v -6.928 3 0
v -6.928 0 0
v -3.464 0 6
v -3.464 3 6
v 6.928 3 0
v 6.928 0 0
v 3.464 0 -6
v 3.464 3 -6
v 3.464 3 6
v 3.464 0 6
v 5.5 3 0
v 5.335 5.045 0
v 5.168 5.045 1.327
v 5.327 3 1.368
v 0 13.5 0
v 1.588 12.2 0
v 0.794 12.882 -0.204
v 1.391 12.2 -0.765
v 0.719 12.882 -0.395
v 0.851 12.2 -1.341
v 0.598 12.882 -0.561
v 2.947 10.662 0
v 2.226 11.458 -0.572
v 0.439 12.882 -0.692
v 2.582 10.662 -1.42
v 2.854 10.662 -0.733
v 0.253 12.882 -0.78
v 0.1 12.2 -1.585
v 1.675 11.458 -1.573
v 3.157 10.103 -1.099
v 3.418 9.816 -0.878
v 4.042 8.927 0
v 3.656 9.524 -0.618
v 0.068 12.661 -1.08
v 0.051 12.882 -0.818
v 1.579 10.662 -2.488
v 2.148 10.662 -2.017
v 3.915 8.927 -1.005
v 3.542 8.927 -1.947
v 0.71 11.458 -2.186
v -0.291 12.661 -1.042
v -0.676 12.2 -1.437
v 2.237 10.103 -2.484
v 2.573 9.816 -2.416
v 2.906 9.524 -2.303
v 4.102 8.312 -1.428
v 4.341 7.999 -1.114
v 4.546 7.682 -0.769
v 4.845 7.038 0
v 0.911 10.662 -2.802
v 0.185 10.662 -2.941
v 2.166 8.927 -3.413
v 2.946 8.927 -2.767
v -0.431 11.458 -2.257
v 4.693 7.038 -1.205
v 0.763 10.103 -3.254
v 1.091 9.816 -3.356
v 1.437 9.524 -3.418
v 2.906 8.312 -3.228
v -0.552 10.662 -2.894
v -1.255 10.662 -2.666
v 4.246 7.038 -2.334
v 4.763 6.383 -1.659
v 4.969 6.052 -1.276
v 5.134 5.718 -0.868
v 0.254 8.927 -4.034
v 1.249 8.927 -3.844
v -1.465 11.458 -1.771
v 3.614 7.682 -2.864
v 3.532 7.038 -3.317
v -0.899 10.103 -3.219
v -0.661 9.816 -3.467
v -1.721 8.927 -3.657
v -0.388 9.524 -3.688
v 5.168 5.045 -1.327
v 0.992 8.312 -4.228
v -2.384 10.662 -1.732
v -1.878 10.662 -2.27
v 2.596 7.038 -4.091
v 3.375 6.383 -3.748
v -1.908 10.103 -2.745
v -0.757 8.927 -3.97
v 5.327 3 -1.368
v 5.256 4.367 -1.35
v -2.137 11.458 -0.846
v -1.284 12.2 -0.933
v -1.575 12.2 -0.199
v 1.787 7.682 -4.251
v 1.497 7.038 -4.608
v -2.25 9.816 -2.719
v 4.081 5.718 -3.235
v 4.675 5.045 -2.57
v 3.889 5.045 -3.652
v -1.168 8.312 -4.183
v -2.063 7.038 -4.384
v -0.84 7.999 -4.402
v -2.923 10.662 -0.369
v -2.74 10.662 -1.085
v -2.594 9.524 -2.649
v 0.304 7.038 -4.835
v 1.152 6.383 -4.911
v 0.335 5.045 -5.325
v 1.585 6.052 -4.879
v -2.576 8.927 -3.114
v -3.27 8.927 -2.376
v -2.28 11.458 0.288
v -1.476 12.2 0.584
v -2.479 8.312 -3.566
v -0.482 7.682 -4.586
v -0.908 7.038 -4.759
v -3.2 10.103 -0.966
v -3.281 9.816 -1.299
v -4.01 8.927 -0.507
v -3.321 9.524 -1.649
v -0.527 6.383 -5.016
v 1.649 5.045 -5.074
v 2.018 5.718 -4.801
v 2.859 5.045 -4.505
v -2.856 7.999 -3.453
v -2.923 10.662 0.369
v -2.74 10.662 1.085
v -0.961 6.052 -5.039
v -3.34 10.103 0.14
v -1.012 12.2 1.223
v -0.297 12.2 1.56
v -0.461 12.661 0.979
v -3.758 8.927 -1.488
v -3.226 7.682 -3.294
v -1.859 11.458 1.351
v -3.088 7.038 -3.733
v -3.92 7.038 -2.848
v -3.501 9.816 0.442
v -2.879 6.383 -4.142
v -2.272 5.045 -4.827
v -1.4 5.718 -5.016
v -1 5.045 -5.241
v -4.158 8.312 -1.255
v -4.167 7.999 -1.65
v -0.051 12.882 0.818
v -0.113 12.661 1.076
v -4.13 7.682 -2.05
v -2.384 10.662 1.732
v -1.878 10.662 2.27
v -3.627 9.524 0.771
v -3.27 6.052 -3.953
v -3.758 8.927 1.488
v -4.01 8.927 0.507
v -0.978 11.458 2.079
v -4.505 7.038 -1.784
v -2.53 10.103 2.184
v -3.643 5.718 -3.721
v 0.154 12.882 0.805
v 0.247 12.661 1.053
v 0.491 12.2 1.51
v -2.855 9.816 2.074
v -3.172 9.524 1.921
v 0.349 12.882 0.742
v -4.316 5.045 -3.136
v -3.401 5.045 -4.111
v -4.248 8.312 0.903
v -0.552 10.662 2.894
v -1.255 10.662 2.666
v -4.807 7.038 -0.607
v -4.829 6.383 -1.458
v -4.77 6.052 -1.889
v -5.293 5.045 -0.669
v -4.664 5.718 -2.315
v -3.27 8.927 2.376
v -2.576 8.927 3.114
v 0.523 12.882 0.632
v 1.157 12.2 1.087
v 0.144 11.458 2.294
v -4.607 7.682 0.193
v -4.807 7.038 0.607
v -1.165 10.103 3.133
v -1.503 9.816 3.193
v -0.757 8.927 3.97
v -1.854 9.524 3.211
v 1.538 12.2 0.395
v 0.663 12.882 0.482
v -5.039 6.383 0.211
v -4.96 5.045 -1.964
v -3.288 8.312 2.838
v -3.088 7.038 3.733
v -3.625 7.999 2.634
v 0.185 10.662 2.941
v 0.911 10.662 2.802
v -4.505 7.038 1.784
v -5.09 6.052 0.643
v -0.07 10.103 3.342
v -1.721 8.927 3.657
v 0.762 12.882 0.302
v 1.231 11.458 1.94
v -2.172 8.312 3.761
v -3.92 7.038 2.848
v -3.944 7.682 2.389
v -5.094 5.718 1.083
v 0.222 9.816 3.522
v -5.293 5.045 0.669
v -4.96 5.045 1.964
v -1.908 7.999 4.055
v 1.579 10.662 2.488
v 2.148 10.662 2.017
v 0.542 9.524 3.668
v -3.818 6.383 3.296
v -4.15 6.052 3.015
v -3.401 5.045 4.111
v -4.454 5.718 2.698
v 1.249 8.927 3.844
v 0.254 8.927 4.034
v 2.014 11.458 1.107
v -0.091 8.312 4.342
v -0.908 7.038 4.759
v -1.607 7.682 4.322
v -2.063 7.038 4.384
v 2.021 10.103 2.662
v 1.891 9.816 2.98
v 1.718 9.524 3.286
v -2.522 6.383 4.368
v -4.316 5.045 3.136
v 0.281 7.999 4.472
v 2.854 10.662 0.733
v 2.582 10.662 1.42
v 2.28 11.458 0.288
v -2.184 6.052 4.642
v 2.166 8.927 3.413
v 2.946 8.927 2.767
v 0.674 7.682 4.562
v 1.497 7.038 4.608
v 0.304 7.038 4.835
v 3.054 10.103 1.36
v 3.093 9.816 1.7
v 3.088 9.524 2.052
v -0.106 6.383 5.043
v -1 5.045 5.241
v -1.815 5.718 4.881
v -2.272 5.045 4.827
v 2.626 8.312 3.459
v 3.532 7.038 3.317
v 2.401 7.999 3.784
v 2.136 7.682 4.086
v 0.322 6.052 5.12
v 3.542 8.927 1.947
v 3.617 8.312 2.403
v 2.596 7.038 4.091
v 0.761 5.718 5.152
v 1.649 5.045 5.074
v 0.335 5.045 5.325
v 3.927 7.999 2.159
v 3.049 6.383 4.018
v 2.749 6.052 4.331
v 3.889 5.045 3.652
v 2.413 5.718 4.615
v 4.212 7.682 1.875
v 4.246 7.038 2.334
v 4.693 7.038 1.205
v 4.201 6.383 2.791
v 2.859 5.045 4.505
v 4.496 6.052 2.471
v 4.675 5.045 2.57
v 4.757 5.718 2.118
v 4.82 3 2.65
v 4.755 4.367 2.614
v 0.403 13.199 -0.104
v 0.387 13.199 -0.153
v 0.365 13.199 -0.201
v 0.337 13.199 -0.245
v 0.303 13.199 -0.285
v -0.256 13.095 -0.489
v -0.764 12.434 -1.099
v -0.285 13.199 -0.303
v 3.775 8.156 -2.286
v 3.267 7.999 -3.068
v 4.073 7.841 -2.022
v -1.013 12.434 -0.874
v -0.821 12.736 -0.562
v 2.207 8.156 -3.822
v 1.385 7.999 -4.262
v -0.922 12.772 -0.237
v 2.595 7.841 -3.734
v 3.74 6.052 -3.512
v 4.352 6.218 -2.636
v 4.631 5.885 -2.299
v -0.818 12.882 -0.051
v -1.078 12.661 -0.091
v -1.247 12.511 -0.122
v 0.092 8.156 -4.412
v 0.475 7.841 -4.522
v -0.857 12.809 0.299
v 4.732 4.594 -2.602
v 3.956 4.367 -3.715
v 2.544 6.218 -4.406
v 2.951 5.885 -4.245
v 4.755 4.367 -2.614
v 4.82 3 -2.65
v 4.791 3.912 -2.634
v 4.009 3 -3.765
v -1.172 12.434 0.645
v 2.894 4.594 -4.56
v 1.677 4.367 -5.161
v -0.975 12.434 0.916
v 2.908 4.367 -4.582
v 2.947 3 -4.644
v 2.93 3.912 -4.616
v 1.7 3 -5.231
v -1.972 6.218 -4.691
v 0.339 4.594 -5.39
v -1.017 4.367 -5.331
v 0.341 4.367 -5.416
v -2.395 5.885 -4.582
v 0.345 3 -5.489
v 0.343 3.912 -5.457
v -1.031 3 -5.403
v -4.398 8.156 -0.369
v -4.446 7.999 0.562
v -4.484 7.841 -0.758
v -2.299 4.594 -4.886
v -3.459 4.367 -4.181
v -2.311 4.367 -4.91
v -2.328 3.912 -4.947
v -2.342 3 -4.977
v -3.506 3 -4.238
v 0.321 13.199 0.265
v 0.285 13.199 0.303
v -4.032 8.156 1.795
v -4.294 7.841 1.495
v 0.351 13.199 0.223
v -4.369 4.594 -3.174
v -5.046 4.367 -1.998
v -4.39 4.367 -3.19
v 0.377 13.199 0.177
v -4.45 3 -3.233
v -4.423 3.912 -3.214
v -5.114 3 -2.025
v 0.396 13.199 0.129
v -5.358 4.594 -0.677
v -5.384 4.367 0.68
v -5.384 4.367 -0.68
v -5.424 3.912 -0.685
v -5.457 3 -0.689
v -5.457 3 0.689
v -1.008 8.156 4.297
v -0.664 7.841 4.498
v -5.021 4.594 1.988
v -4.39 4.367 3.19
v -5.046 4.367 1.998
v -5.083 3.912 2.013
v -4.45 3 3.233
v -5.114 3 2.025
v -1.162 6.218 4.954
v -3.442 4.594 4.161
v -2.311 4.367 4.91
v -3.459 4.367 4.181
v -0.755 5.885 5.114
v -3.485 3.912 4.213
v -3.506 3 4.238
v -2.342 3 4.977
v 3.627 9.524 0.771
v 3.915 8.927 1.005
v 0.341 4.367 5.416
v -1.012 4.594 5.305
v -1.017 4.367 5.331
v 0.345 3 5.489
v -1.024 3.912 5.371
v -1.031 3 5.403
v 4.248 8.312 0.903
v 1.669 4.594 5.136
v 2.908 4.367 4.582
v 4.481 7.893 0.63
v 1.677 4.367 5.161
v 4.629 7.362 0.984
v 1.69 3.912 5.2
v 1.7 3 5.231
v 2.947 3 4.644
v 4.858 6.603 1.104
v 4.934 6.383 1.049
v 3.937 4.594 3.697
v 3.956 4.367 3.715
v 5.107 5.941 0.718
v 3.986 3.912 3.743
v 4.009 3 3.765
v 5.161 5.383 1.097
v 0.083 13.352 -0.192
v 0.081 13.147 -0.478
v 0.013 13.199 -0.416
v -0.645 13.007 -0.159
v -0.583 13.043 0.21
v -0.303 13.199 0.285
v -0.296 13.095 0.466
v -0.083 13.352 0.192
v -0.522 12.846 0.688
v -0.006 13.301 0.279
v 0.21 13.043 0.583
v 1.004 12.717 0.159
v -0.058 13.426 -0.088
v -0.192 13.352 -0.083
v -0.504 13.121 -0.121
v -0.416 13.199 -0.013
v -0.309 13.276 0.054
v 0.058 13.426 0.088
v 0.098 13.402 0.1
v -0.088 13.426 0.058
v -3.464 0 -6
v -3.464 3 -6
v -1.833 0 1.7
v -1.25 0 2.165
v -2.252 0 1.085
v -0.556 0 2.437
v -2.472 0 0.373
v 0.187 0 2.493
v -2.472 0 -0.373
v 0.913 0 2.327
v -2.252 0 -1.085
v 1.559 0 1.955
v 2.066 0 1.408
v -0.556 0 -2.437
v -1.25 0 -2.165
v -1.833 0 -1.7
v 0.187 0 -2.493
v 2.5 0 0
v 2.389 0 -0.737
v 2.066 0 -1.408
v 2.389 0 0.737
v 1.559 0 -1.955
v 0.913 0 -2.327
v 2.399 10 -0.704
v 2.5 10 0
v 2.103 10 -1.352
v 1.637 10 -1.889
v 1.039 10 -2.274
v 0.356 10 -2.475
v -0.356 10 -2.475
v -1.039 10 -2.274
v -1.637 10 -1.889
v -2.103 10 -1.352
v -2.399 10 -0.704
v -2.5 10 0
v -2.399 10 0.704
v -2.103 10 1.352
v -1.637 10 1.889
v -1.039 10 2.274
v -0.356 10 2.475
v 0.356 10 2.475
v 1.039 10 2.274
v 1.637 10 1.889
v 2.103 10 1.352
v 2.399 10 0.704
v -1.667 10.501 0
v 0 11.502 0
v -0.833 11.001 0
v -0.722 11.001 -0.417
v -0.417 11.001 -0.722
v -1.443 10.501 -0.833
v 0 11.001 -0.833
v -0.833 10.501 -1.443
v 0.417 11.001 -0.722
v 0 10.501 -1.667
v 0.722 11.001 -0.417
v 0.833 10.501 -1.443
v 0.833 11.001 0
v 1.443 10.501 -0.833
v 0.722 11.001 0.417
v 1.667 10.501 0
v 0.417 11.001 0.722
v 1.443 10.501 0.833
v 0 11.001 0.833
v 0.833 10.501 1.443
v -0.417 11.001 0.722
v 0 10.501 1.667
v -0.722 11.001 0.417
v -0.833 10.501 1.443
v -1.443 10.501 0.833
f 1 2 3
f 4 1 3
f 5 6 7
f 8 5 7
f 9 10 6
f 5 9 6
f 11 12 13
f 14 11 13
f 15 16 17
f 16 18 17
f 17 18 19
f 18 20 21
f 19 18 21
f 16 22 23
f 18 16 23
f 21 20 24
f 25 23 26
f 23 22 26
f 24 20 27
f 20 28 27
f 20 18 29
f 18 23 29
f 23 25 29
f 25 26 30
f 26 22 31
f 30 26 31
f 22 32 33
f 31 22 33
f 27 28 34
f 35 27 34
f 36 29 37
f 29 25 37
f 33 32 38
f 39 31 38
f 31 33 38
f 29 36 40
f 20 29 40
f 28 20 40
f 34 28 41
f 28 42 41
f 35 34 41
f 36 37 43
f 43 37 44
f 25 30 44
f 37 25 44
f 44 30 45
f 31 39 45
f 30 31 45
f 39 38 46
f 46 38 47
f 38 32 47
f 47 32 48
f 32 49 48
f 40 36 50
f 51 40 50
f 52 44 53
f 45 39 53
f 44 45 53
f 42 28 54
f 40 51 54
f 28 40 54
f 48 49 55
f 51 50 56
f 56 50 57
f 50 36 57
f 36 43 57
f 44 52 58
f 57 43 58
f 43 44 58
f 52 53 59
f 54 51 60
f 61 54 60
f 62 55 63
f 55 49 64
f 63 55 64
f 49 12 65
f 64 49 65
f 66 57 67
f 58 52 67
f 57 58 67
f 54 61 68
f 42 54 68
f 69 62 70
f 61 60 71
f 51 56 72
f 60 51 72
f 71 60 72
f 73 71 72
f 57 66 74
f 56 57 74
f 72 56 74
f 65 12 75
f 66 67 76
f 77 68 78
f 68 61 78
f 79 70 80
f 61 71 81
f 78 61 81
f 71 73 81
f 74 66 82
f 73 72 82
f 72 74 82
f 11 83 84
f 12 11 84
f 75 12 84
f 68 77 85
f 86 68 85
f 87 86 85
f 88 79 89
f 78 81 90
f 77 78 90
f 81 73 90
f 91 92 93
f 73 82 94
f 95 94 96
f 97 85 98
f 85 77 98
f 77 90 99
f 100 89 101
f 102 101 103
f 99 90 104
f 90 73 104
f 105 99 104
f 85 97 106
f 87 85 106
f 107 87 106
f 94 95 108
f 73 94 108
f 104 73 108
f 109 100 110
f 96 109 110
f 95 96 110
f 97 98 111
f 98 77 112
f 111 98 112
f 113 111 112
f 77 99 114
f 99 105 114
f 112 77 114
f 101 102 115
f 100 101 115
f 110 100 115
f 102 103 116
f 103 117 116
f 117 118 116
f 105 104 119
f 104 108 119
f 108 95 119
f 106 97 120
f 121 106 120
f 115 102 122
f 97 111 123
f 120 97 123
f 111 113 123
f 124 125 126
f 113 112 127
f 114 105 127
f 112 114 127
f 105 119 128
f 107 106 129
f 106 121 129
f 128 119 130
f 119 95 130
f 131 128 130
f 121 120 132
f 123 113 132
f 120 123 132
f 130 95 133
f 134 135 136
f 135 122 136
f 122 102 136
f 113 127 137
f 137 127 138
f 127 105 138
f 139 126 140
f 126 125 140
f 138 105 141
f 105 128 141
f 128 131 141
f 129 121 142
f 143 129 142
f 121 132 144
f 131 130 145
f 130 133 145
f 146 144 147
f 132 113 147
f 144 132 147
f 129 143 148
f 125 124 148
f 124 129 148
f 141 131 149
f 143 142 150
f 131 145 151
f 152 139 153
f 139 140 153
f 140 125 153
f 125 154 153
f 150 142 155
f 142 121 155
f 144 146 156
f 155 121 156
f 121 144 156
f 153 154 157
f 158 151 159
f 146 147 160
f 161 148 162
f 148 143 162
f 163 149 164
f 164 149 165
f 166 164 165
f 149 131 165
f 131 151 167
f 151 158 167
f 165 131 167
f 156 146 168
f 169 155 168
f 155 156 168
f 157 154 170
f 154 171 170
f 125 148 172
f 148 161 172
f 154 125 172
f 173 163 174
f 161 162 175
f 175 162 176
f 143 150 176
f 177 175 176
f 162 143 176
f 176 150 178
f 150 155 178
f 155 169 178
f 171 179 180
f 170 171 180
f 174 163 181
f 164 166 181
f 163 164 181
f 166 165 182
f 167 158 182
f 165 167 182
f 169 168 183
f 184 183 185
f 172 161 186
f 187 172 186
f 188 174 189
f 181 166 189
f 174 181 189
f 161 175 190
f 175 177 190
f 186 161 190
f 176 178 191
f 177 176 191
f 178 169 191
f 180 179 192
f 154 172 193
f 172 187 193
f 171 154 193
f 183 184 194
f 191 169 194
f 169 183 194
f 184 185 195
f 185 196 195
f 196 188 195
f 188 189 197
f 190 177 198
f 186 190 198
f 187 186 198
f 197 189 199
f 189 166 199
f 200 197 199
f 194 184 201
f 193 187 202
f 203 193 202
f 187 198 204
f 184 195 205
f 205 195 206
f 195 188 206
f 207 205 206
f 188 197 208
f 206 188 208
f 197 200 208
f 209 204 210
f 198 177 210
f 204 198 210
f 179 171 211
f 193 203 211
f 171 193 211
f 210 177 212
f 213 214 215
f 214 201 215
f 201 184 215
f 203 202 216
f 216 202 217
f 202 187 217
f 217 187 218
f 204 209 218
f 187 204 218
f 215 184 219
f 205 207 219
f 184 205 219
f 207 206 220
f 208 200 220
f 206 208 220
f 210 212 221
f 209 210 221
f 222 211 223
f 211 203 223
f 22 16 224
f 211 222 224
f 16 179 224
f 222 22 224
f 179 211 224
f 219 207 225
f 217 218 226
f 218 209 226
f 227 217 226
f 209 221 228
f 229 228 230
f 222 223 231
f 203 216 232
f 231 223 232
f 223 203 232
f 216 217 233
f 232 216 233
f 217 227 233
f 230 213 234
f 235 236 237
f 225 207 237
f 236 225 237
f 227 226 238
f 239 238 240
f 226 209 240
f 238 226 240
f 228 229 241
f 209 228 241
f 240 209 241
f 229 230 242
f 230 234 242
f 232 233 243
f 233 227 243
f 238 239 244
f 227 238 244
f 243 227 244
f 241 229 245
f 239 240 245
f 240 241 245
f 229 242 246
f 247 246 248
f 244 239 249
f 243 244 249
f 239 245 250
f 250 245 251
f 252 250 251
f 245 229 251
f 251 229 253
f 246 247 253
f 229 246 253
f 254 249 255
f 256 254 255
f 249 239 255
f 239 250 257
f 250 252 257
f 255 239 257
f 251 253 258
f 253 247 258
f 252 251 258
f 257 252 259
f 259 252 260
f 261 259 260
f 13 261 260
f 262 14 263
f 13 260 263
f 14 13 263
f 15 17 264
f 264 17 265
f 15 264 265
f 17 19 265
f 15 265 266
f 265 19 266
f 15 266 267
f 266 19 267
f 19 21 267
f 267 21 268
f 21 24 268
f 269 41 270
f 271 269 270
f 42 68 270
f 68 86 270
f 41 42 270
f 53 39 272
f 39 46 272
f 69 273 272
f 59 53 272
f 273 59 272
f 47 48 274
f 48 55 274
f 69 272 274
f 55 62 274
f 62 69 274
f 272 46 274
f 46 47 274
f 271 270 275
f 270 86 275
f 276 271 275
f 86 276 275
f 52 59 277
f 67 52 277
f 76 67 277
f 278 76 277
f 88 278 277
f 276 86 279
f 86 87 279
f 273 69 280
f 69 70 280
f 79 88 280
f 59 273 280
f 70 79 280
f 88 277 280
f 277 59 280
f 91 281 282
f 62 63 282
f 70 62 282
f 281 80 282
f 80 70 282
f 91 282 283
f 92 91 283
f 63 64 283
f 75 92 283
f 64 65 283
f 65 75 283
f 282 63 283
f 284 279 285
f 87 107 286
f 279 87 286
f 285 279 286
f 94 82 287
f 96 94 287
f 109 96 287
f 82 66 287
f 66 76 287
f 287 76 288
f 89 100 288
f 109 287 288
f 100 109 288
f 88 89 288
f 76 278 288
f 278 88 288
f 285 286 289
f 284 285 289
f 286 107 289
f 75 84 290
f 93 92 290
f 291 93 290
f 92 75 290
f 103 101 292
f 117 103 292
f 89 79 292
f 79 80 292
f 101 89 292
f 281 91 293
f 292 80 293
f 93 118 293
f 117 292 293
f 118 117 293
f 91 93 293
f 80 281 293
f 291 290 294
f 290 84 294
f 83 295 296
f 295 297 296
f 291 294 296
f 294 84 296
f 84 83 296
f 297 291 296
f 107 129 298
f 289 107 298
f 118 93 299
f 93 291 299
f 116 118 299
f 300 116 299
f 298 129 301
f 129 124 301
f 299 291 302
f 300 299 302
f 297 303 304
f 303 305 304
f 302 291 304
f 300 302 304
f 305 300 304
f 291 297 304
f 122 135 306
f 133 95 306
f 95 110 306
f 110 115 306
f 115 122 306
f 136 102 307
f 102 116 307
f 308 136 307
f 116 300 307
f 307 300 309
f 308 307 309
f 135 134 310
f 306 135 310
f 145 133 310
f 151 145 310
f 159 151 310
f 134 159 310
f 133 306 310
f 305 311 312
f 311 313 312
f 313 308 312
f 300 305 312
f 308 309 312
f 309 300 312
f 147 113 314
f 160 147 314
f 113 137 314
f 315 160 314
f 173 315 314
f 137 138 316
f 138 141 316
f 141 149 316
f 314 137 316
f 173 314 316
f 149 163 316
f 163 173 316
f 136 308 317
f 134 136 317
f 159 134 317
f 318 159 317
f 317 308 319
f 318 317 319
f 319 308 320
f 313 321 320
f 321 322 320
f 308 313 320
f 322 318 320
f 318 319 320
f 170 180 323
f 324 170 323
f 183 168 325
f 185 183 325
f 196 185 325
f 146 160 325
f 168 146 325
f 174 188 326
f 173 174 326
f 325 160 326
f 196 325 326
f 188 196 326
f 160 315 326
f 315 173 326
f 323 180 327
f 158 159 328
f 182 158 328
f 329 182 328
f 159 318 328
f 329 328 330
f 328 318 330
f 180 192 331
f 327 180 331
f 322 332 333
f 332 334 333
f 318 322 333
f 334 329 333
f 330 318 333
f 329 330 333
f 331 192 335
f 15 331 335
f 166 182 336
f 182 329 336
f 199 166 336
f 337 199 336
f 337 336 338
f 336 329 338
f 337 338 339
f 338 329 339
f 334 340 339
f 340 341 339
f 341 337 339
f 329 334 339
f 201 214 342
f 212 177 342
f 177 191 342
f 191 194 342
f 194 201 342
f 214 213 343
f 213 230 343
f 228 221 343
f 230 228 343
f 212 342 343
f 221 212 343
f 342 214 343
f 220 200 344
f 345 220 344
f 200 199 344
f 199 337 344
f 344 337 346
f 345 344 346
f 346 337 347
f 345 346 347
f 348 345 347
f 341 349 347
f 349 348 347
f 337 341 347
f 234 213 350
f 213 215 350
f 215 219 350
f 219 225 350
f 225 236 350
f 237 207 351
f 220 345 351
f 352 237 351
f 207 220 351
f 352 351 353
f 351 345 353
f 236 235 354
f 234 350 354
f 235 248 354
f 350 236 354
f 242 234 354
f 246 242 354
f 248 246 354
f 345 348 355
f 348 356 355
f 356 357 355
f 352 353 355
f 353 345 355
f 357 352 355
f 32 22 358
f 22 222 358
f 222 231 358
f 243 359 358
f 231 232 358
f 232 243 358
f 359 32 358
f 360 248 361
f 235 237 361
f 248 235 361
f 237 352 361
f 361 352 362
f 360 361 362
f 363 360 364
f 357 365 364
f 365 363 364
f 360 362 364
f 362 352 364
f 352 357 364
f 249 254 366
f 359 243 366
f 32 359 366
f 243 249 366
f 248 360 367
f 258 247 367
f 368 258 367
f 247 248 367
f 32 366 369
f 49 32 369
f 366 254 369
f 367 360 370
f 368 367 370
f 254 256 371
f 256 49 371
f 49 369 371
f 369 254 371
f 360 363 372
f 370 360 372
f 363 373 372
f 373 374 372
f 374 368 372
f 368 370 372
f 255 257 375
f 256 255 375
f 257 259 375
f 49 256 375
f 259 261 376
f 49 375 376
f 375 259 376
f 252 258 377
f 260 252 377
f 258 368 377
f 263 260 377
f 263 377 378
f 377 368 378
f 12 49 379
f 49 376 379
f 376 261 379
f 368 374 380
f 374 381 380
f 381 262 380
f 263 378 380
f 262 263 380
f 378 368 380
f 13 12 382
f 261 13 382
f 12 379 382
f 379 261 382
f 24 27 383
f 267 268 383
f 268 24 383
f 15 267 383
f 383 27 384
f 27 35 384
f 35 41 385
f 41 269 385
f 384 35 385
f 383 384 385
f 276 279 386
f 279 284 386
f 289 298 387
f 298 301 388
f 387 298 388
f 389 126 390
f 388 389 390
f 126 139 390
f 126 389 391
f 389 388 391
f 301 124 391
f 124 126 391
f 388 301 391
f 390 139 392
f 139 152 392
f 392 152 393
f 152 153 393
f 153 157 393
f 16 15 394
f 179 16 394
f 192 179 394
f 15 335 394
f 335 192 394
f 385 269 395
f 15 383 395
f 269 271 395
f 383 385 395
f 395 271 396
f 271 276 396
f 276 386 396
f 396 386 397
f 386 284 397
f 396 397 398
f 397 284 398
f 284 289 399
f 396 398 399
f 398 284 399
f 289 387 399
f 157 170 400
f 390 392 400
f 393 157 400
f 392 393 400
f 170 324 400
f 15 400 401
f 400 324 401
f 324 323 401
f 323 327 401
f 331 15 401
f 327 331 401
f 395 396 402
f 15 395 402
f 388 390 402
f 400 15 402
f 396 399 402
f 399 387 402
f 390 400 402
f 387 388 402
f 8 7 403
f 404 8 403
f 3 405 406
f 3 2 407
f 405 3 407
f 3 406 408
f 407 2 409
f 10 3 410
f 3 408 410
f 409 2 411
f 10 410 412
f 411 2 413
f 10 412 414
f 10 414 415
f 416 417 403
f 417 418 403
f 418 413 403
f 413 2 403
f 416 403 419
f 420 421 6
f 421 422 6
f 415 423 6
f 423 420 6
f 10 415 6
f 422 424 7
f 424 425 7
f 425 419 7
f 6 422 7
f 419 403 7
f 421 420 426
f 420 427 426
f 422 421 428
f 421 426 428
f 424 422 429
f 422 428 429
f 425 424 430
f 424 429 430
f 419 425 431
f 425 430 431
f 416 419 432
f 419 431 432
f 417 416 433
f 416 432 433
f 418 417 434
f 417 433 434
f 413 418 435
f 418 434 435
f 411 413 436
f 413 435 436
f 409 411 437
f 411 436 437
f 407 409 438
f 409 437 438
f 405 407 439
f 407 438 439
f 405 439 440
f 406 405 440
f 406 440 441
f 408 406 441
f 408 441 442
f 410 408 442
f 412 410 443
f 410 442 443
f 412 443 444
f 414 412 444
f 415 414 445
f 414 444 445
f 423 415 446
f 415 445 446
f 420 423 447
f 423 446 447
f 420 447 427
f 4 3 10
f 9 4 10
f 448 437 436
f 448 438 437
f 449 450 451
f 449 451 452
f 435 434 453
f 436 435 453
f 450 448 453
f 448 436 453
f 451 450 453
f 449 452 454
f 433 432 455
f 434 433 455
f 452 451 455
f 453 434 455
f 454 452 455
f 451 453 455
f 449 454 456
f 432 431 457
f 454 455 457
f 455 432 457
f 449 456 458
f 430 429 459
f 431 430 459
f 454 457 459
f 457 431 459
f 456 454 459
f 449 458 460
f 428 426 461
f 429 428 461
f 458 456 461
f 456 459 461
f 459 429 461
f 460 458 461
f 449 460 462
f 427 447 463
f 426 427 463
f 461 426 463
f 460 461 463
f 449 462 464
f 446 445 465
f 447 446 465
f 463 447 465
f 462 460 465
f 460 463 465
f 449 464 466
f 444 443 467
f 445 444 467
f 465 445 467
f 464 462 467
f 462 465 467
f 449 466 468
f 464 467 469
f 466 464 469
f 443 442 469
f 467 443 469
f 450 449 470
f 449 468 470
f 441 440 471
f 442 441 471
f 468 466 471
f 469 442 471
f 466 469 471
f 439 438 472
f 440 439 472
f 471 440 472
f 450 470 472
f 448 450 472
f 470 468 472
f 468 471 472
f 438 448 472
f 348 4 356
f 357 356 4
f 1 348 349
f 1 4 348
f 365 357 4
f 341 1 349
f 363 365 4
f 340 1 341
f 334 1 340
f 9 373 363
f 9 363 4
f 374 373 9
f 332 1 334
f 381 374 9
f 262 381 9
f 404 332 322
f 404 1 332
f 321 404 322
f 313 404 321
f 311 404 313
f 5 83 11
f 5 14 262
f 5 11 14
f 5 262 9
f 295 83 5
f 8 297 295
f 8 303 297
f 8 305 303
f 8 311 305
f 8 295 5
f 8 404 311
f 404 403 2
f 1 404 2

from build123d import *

# Parameters (mm, degrees)
BOSS_EXTRUDE1_DEPTH   = 3
M6_TAPPED_HOLE1_D     = 5
M6_TAPPED_HOLE1_DEPTH = 10
M6_TAPPED_HOLE1_TIP   = 1.502151548


with BuildPart() as part:
    # Sketch1 → Boss-Extrude1 (new body)
    with BuildSketch(Plane(origin=(0, 0, 0), x_dir=(1, 0, 0), z_dir=(0, 1, 0))):
        Polygon((6.92820323, 0), (3.464101615, 6), (-3.464101615, 6), (-6.92820323, 0), (-3.464101615, -6), (3.464101615, -6), align=None)
    extrude(amount=BOSS_EXTRUDE1_DEPTH)

    # Sketch2 → Revolve1 (revolve)
    with BuildSketch(Plane.XY):
        with BuildLine():
            Line((0, 3), (0, 13.5))
            ThreePointArc((0, 13.5), (4.041757337, 8.926634796), (5.5, 3))
            Line((5.5, 3), (0, 3))
        make_face()
    revolve(axis=Axis((0, 3, 0), (0, 1, 0)))

    # M6 Tapped Hole1
    with Locations(Plane(origin=(0, 0, 0), x_dir=(-1, 0, 0), z_dir=(0, -1, 0))):
        with Locations((0, 0)):
            Hole(M6_TAPPED_HOLE1_D / 2, depth=M6_TAPPED_HOLE1_DEPTH)
            with Locations((0, 0, -(M6_TAPPED_HOLE1_DEPTH + M6_TAPPED_HOLE1_TIP / 2))):  # 118° drill point
                Cone(0, M6_TAPPED_HOLE1_D / 2, M6_TAPPED_HOLE1_TIP, mode=Mode.SUBTRACT)


solid = part.part
